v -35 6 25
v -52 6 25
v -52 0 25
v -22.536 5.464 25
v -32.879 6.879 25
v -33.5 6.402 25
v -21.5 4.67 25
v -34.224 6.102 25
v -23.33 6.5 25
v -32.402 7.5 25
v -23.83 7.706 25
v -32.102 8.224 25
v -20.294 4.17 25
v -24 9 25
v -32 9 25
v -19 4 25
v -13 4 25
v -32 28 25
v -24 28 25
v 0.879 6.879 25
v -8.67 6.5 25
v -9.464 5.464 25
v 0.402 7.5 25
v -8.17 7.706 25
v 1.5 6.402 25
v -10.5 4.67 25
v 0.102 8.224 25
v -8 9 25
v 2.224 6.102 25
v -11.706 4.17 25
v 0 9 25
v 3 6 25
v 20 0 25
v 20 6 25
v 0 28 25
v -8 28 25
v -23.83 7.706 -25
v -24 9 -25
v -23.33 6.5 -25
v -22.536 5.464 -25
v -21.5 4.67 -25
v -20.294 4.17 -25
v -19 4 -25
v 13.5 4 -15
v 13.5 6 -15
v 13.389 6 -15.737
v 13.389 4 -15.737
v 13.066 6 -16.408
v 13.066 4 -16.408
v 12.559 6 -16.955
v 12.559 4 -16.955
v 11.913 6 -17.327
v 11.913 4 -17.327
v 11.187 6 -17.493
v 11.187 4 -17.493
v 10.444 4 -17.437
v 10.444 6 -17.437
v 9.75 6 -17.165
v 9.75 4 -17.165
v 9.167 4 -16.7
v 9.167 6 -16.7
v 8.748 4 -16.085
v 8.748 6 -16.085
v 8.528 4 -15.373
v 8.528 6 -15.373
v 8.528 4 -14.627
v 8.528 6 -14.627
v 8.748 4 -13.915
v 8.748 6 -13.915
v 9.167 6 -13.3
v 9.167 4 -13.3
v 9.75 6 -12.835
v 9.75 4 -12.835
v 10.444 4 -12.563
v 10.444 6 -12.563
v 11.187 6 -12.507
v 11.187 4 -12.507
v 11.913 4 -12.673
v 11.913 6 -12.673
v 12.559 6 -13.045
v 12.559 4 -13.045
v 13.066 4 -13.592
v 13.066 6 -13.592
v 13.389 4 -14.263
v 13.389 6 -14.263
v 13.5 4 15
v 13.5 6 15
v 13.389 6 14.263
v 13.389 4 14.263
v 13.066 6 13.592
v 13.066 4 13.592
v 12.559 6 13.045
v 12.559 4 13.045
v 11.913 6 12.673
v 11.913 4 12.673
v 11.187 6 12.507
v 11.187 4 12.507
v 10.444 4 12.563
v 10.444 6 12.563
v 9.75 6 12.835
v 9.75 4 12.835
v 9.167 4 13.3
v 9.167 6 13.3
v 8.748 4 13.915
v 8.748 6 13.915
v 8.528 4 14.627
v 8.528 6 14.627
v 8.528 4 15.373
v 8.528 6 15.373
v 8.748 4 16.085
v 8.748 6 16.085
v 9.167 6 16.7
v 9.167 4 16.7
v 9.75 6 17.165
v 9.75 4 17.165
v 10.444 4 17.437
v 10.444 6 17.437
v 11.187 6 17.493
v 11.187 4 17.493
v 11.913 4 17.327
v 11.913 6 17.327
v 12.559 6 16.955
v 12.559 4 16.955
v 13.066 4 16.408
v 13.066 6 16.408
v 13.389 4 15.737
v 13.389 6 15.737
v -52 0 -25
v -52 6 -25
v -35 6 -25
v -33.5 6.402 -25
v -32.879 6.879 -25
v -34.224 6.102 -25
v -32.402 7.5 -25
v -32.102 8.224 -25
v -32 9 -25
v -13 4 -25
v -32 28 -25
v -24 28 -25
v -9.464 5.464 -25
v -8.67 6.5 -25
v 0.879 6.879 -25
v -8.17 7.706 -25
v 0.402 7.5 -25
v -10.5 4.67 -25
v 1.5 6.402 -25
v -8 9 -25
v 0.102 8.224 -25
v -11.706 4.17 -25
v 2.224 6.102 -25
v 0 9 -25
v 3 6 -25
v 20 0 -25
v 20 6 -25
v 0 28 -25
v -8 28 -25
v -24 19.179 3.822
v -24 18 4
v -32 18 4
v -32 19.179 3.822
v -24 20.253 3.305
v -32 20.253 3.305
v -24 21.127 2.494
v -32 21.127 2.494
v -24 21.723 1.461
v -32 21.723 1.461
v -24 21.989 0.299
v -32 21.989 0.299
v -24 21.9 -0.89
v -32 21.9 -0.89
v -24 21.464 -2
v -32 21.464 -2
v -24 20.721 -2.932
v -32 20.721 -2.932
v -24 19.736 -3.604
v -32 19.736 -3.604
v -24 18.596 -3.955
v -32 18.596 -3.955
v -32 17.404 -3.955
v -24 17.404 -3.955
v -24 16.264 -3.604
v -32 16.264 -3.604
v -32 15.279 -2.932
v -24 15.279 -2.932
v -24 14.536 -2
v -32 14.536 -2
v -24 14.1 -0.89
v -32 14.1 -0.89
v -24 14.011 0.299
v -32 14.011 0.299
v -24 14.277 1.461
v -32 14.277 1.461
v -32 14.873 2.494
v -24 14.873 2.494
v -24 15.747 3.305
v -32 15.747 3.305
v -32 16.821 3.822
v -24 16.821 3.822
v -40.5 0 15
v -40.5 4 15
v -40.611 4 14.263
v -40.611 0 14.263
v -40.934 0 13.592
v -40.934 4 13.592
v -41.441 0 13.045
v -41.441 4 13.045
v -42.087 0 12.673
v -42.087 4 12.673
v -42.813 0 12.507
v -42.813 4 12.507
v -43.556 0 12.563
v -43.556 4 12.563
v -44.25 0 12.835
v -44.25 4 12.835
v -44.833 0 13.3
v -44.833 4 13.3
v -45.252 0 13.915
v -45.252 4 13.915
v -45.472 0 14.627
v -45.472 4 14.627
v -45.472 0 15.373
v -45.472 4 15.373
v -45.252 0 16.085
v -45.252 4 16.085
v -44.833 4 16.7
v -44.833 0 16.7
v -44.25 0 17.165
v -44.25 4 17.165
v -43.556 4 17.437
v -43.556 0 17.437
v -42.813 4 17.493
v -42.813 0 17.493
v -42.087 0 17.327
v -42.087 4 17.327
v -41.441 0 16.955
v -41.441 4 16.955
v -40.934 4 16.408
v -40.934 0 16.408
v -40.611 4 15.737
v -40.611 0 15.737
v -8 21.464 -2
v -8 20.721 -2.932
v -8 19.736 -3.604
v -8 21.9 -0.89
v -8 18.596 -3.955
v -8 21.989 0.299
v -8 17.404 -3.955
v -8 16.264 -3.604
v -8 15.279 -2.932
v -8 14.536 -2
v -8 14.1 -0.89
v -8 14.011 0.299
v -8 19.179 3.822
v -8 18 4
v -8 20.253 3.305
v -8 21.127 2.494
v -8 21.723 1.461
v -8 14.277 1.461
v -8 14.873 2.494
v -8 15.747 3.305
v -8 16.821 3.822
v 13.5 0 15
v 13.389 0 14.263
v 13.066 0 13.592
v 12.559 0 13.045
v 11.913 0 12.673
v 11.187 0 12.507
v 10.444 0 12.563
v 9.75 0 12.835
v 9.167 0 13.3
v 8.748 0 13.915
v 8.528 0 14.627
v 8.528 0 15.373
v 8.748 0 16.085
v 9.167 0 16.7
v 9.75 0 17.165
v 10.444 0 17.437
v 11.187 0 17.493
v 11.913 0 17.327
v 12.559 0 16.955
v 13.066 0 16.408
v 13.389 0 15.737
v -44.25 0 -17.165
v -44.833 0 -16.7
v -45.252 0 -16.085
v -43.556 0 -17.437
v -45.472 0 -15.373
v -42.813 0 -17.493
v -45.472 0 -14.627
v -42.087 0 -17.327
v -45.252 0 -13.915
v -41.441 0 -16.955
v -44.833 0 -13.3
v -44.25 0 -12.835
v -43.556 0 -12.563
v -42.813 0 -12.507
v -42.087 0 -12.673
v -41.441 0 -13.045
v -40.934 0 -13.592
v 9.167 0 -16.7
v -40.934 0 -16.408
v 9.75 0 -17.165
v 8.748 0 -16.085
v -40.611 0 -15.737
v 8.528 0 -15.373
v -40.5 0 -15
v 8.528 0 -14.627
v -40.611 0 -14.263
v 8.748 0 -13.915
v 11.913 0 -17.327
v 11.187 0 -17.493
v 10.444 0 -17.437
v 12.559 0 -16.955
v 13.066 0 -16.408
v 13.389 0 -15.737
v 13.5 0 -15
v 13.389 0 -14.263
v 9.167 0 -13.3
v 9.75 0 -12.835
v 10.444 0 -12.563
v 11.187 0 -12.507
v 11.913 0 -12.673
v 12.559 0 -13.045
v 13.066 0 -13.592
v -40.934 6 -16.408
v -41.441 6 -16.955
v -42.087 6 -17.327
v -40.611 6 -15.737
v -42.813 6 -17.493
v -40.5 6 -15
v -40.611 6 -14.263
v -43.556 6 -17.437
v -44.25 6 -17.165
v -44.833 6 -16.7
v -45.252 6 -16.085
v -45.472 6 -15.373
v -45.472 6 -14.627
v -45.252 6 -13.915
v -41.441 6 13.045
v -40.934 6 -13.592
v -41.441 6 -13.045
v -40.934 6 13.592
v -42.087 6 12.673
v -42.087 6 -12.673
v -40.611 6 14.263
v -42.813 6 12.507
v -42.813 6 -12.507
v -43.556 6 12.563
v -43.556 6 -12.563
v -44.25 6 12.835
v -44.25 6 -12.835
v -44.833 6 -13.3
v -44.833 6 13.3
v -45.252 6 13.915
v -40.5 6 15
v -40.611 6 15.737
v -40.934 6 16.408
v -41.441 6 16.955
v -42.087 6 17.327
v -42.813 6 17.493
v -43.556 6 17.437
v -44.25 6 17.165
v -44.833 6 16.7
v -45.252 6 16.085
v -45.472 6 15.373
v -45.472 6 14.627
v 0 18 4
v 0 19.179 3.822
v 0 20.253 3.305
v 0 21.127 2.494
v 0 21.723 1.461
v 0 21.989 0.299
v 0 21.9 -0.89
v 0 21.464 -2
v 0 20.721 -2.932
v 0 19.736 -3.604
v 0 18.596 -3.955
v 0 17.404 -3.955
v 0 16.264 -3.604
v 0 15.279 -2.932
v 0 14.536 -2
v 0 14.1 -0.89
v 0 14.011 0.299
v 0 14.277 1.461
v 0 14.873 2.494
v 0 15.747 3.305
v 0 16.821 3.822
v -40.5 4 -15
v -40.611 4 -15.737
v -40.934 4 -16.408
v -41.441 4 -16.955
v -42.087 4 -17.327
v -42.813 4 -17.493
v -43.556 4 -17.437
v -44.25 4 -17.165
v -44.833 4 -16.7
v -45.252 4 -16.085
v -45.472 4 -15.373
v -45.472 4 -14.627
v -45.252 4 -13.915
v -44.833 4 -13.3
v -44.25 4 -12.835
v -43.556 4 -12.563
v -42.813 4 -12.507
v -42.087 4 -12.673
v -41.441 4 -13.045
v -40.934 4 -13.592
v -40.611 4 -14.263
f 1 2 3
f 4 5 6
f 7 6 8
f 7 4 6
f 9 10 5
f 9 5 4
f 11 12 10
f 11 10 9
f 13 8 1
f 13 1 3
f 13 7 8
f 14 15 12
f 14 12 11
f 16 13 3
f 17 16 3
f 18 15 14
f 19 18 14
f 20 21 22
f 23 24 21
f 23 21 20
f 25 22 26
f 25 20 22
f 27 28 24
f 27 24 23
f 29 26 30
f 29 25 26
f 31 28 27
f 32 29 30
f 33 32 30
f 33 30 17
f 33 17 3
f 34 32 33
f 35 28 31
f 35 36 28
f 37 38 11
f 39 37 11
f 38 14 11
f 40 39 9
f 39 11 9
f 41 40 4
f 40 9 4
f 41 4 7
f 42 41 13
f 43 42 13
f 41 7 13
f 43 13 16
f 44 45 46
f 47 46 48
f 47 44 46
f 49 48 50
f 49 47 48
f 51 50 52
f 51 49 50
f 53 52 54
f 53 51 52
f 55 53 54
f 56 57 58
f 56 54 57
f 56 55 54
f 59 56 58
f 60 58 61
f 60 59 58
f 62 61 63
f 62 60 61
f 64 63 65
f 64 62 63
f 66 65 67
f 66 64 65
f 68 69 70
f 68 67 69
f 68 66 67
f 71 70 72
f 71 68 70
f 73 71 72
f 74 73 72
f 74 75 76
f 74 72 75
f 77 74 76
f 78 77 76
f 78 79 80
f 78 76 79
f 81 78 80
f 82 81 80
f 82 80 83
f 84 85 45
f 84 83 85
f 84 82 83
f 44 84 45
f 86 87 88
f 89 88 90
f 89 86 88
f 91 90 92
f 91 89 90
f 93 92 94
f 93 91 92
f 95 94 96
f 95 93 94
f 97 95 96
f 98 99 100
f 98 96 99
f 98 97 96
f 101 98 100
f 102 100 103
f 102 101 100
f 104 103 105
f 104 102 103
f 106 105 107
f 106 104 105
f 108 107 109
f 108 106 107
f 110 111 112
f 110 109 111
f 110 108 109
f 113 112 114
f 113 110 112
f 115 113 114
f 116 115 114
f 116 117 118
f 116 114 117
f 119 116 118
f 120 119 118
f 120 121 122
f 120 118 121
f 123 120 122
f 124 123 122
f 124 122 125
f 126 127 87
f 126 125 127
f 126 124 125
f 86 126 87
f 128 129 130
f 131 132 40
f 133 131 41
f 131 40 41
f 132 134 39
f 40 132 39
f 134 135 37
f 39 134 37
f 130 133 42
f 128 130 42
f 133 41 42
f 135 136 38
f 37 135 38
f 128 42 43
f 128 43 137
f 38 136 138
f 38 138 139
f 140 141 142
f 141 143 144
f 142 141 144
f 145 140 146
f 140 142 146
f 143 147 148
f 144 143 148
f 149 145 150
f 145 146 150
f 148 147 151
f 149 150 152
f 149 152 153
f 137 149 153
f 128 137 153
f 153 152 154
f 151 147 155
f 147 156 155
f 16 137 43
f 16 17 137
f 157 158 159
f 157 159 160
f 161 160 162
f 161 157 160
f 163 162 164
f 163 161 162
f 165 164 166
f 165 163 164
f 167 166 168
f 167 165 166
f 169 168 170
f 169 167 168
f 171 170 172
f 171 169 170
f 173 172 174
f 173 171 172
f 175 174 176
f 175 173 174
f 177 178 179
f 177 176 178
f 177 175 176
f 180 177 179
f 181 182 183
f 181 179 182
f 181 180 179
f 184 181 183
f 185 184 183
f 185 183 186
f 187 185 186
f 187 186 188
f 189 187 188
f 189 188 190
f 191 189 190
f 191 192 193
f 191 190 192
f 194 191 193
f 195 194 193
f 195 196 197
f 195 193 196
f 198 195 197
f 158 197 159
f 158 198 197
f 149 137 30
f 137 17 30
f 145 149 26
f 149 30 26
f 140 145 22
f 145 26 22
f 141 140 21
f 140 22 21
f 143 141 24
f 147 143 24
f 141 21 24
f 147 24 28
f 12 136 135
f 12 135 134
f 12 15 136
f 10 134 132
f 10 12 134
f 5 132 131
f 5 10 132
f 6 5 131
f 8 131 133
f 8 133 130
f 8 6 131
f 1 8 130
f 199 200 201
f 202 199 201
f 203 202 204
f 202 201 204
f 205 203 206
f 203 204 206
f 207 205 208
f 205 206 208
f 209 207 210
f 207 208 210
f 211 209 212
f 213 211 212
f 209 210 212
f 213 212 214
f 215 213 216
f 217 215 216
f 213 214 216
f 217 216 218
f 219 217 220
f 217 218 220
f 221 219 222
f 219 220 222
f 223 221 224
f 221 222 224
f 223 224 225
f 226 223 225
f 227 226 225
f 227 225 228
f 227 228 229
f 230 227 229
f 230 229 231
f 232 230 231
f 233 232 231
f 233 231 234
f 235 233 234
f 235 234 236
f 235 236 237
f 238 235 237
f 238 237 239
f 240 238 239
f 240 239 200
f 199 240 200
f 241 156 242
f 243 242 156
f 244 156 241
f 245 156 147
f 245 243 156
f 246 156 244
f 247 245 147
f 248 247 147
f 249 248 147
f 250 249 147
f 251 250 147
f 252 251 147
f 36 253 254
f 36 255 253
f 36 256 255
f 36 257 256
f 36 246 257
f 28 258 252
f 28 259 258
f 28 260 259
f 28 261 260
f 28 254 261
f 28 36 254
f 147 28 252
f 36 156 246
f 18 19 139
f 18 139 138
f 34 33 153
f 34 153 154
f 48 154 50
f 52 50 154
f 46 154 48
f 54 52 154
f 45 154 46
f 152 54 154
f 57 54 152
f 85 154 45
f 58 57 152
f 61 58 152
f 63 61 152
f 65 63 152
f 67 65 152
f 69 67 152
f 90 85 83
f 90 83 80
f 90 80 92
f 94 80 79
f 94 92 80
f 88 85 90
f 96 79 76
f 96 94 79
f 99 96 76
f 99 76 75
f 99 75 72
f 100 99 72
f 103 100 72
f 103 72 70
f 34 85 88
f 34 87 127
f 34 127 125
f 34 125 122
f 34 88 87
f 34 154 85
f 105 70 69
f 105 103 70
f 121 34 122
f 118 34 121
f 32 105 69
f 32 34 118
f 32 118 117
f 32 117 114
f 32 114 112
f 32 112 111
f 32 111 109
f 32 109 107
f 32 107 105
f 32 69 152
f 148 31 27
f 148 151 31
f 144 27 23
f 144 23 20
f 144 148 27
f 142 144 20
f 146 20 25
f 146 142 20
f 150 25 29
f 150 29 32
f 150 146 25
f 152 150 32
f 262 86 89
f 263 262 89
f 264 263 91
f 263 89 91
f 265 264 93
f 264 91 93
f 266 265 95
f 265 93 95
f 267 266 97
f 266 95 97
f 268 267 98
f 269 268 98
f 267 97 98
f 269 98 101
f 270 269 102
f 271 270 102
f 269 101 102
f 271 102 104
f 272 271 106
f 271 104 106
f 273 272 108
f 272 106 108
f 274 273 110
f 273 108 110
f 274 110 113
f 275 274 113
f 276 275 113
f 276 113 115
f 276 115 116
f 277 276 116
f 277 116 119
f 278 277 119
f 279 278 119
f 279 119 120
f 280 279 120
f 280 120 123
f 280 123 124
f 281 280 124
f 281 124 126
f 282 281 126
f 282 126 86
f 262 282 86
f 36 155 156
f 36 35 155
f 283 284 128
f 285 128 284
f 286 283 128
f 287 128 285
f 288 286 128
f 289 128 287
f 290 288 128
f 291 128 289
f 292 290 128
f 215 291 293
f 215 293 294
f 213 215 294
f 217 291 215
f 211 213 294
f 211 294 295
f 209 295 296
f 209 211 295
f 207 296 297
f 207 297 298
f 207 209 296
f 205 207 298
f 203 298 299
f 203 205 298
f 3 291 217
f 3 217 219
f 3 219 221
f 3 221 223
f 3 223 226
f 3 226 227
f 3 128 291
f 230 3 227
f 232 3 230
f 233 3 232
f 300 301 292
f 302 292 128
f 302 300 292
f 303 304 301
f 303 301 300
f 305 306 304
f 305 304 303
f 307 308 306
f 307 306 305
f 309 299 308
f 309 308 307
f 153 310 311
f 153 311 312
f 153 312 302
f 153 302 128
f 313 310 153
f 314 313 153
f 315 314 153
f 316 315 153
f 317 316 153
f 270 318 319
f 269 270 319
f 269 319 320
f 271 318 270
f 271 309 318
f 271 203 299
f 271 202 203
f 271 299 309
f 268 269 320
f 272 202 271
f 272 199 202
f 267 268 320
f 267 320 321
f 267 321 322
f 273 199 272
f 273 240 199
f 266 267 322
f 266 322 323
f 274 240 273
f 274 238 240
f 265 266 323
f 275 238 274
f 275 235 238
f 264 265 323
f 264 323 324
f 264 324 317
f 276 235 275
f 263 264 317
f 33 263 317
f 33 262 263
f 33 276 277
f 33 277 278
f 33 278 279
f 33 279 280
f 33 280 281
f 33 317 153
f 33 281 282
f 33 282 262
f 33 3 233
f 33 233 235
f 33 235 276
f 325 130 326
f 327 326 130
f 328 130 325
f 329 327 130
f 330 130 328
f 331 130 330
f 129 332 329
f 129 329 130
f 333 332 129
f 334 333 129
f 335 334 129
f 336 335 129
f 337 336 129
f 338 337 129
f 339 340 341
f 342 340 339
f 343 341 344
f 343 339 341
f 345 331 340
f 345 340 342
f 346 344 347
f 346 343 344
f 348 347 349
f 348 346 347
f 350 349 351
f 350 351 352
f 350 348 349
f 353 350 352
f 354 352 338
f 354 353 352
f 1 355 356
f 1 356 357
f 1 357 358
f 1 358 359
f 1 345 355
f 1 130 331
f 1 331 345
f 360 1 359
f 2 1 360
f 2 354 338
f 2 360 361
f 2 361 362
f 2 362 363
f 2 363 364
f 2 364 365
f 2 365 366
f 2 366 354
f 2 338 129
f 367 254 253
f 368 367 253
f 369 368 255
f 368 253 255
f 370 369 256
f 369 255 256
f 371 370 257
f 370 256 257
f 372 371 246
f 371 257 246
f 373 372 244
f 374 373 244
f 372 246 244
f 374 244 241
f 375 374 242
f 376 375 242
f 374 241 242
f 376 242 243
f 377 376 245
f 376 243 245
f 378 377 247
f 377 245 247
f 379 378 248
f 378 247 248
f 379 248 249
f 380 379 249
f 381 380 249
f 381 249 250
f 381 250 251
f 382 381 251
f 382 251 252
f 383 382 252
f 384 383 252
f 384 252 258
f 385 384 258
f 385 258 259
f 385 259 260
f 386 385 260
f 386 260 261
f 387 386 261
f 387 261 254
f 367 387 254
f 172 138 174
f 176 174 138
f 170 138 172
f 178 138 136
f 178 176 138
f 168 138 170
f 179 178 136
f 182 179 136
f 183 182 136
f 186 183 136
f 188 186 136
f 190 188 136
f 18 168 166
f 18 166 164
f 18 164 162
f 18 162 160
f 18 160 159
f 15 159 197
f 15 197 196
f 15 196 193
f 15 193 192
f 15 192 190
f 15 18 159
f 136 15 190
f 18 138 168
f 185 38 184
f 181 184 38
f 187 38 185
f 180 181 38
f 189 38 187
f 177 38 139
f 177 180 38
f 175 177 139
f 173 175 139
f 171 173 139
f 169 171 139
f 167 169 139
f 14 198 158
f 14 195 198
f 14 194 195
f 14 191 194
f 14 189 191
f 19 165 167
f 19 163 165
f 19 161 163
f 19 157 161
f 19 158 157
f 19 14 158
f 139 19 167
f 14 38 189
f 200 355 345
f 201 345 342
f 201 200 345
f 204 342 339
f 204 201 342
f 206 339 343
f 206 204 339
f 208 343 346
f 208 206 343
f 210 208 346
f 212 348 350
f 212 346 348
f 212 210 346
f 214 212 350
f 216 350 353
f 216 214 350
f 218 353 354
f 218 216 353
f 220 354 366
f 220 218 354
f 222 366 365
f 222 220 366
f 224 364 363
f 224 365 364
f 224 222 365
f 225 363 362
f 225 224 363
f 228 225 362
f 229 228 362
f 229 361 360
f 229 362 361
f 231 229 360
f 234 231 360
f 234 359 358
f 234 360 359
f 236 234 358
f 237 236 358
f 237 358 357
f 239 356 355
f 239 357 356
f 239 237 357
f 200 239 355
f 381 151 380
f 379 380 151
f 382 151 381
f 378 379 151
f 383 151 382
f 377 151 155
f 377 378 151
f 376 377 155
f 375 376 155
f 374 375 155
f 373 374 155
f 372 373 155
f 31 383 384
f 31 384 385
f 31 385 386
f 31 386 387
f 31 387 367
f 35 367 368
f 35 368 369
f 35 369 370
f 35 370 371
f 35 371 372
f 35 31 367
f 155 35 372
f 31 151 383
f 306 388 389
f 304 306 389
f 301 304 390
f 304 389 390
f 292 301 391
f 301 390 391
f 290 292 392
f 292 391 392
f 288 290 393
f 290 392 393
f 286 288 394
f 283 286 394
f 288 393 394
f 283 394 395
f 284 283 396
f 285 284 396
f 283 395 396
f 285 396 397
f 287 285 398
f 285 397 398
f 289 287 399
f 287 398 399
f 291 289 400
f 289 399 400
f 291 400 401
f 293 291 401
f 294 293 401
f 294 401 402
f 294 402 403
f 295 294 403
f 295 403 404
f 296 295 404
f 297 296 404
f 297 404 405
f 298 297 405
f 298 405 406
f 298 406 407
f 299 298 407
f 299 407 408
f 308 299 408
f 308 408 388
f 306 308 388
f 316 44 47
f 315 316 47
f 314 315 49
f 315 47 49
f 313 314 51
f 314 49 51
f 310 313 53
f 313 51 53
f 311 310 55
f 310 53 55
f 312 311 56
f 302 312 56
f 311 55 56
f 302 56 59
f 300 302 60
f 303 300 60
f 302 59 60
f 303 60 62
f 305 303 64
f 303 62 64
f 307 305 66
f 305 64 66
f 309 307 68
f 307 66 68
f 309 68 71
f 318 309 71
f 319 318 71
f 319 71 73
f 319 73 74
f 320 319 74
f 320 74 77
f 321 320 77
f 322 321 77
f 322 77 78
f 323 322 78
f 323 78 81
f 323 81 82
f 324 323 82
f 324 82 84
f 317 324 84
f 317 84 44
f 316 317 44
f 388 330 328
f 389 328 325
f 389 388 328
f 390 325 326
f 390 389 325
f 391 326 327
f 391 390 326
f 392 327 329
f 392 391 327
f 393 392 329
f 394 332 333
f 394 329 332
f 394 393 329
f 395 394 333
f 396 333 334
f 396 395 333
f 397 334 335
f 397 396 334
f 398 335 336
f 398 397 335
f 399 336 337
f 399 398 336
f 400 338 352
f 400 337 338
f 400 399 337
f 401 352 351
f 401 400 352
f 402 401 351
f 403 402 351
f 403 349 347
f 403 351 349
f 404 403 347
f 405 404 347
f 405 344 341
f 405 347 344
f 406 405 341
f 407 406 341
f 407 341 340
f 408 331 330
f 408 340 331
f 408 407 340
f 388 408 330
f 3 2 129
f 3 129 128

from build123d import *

# Parameters (mm, degrees)
BOSS_EXTRUDE1_DEPTH     = 25
SKETCH2_R               = 4
CUT_EXTRUDE1_DEPTH      = 45
CUT_EXTRUDE1_DEPTH_BACK = 29
FILLET1_R               = 3
FILLET2_R               = 5
SKETCH3_R               = 2.5
CUT_EXTRUDE2_DEPTH      = 25
CUT_EXTRUDE2_DEPTH_BACK = 5


with BuildPart() as part:
    # Sketch1 → Boss-Extrude1 (new body, symmetric)
    with BuildSketch(Plane.XY):
        Polygon((0, 28), (-8, 28), (-8, 4), (-24, 4), (-24, 28), (-32, 28), (-32, 6), (-52, 6), (-52, 0), (-32, 0), (0, 0), (20, 0), (20, 6), (0, 6), align=None)
    extrude(amount=BOSS_EXTRUDE1_DEPTH, both=True)

    # Sketch2 → Cut-Extrude1 (cut, two sides)
    with BuildSketch(Plane.ZY.offset(8)) as cut_extrude1_sk:
        with Locations((0, 18)):
            Circle(SKETCH2_R)
    extrude(amount=CUT_EXTRUDE1_DEPTH, mode=Mode.SUBTRACT)
    extrude(cut_extrude1_sk.sketch, amount=-CUT_EXTRUDE1_DEPTH_BACK, mode=Mode.SUBTRACT)

    # Fillet1
    fillet1_edges = [part.edges().sort_by_distance(p)[0] for p in [
        (0, 6, 0),
        (-32, 6, 0),
    ]]
    fillet(fillet1_edges, radius=FILLET1_R)

    # Fillet2
    fillet2_edges = [part.edges().sort_by_distance(p)[0] for p in [
        (-8, 4, 0),
        (-24, 4, 0),
    ]]
    fillet(fillet2_edges, radius=FILLET2_R)

    # Sketch3 → Cut-Extrude2 (cut, two sides)
    with BuildSketch(Plane(origin=(0, 4, 0), x_dir=(1, 0, 0), z_dir=(0, 1, 0))) as cut_extrude2_sk:
        with Locations((-43, 15)):
            Circle(SKETCH3_R)
        with Locations((11, 15)):
            Circle(SKETCH3_R)
        with Locations((11, -15)):
            Circle(SKETCH3_R)
        with Locations((-43, -15)):
            Circle(SKETCH3_R)
    extrude(amount=CUT_EXTRUDE2_DEPTH, mode=Mode.SUBTRACT)
    extrude(cut_extrude2_sk.sketch, amount=-CUT_EXTRUDE2_DEPTH_BACK, mode=Mode.SUBTRACT)


solid = part.part
